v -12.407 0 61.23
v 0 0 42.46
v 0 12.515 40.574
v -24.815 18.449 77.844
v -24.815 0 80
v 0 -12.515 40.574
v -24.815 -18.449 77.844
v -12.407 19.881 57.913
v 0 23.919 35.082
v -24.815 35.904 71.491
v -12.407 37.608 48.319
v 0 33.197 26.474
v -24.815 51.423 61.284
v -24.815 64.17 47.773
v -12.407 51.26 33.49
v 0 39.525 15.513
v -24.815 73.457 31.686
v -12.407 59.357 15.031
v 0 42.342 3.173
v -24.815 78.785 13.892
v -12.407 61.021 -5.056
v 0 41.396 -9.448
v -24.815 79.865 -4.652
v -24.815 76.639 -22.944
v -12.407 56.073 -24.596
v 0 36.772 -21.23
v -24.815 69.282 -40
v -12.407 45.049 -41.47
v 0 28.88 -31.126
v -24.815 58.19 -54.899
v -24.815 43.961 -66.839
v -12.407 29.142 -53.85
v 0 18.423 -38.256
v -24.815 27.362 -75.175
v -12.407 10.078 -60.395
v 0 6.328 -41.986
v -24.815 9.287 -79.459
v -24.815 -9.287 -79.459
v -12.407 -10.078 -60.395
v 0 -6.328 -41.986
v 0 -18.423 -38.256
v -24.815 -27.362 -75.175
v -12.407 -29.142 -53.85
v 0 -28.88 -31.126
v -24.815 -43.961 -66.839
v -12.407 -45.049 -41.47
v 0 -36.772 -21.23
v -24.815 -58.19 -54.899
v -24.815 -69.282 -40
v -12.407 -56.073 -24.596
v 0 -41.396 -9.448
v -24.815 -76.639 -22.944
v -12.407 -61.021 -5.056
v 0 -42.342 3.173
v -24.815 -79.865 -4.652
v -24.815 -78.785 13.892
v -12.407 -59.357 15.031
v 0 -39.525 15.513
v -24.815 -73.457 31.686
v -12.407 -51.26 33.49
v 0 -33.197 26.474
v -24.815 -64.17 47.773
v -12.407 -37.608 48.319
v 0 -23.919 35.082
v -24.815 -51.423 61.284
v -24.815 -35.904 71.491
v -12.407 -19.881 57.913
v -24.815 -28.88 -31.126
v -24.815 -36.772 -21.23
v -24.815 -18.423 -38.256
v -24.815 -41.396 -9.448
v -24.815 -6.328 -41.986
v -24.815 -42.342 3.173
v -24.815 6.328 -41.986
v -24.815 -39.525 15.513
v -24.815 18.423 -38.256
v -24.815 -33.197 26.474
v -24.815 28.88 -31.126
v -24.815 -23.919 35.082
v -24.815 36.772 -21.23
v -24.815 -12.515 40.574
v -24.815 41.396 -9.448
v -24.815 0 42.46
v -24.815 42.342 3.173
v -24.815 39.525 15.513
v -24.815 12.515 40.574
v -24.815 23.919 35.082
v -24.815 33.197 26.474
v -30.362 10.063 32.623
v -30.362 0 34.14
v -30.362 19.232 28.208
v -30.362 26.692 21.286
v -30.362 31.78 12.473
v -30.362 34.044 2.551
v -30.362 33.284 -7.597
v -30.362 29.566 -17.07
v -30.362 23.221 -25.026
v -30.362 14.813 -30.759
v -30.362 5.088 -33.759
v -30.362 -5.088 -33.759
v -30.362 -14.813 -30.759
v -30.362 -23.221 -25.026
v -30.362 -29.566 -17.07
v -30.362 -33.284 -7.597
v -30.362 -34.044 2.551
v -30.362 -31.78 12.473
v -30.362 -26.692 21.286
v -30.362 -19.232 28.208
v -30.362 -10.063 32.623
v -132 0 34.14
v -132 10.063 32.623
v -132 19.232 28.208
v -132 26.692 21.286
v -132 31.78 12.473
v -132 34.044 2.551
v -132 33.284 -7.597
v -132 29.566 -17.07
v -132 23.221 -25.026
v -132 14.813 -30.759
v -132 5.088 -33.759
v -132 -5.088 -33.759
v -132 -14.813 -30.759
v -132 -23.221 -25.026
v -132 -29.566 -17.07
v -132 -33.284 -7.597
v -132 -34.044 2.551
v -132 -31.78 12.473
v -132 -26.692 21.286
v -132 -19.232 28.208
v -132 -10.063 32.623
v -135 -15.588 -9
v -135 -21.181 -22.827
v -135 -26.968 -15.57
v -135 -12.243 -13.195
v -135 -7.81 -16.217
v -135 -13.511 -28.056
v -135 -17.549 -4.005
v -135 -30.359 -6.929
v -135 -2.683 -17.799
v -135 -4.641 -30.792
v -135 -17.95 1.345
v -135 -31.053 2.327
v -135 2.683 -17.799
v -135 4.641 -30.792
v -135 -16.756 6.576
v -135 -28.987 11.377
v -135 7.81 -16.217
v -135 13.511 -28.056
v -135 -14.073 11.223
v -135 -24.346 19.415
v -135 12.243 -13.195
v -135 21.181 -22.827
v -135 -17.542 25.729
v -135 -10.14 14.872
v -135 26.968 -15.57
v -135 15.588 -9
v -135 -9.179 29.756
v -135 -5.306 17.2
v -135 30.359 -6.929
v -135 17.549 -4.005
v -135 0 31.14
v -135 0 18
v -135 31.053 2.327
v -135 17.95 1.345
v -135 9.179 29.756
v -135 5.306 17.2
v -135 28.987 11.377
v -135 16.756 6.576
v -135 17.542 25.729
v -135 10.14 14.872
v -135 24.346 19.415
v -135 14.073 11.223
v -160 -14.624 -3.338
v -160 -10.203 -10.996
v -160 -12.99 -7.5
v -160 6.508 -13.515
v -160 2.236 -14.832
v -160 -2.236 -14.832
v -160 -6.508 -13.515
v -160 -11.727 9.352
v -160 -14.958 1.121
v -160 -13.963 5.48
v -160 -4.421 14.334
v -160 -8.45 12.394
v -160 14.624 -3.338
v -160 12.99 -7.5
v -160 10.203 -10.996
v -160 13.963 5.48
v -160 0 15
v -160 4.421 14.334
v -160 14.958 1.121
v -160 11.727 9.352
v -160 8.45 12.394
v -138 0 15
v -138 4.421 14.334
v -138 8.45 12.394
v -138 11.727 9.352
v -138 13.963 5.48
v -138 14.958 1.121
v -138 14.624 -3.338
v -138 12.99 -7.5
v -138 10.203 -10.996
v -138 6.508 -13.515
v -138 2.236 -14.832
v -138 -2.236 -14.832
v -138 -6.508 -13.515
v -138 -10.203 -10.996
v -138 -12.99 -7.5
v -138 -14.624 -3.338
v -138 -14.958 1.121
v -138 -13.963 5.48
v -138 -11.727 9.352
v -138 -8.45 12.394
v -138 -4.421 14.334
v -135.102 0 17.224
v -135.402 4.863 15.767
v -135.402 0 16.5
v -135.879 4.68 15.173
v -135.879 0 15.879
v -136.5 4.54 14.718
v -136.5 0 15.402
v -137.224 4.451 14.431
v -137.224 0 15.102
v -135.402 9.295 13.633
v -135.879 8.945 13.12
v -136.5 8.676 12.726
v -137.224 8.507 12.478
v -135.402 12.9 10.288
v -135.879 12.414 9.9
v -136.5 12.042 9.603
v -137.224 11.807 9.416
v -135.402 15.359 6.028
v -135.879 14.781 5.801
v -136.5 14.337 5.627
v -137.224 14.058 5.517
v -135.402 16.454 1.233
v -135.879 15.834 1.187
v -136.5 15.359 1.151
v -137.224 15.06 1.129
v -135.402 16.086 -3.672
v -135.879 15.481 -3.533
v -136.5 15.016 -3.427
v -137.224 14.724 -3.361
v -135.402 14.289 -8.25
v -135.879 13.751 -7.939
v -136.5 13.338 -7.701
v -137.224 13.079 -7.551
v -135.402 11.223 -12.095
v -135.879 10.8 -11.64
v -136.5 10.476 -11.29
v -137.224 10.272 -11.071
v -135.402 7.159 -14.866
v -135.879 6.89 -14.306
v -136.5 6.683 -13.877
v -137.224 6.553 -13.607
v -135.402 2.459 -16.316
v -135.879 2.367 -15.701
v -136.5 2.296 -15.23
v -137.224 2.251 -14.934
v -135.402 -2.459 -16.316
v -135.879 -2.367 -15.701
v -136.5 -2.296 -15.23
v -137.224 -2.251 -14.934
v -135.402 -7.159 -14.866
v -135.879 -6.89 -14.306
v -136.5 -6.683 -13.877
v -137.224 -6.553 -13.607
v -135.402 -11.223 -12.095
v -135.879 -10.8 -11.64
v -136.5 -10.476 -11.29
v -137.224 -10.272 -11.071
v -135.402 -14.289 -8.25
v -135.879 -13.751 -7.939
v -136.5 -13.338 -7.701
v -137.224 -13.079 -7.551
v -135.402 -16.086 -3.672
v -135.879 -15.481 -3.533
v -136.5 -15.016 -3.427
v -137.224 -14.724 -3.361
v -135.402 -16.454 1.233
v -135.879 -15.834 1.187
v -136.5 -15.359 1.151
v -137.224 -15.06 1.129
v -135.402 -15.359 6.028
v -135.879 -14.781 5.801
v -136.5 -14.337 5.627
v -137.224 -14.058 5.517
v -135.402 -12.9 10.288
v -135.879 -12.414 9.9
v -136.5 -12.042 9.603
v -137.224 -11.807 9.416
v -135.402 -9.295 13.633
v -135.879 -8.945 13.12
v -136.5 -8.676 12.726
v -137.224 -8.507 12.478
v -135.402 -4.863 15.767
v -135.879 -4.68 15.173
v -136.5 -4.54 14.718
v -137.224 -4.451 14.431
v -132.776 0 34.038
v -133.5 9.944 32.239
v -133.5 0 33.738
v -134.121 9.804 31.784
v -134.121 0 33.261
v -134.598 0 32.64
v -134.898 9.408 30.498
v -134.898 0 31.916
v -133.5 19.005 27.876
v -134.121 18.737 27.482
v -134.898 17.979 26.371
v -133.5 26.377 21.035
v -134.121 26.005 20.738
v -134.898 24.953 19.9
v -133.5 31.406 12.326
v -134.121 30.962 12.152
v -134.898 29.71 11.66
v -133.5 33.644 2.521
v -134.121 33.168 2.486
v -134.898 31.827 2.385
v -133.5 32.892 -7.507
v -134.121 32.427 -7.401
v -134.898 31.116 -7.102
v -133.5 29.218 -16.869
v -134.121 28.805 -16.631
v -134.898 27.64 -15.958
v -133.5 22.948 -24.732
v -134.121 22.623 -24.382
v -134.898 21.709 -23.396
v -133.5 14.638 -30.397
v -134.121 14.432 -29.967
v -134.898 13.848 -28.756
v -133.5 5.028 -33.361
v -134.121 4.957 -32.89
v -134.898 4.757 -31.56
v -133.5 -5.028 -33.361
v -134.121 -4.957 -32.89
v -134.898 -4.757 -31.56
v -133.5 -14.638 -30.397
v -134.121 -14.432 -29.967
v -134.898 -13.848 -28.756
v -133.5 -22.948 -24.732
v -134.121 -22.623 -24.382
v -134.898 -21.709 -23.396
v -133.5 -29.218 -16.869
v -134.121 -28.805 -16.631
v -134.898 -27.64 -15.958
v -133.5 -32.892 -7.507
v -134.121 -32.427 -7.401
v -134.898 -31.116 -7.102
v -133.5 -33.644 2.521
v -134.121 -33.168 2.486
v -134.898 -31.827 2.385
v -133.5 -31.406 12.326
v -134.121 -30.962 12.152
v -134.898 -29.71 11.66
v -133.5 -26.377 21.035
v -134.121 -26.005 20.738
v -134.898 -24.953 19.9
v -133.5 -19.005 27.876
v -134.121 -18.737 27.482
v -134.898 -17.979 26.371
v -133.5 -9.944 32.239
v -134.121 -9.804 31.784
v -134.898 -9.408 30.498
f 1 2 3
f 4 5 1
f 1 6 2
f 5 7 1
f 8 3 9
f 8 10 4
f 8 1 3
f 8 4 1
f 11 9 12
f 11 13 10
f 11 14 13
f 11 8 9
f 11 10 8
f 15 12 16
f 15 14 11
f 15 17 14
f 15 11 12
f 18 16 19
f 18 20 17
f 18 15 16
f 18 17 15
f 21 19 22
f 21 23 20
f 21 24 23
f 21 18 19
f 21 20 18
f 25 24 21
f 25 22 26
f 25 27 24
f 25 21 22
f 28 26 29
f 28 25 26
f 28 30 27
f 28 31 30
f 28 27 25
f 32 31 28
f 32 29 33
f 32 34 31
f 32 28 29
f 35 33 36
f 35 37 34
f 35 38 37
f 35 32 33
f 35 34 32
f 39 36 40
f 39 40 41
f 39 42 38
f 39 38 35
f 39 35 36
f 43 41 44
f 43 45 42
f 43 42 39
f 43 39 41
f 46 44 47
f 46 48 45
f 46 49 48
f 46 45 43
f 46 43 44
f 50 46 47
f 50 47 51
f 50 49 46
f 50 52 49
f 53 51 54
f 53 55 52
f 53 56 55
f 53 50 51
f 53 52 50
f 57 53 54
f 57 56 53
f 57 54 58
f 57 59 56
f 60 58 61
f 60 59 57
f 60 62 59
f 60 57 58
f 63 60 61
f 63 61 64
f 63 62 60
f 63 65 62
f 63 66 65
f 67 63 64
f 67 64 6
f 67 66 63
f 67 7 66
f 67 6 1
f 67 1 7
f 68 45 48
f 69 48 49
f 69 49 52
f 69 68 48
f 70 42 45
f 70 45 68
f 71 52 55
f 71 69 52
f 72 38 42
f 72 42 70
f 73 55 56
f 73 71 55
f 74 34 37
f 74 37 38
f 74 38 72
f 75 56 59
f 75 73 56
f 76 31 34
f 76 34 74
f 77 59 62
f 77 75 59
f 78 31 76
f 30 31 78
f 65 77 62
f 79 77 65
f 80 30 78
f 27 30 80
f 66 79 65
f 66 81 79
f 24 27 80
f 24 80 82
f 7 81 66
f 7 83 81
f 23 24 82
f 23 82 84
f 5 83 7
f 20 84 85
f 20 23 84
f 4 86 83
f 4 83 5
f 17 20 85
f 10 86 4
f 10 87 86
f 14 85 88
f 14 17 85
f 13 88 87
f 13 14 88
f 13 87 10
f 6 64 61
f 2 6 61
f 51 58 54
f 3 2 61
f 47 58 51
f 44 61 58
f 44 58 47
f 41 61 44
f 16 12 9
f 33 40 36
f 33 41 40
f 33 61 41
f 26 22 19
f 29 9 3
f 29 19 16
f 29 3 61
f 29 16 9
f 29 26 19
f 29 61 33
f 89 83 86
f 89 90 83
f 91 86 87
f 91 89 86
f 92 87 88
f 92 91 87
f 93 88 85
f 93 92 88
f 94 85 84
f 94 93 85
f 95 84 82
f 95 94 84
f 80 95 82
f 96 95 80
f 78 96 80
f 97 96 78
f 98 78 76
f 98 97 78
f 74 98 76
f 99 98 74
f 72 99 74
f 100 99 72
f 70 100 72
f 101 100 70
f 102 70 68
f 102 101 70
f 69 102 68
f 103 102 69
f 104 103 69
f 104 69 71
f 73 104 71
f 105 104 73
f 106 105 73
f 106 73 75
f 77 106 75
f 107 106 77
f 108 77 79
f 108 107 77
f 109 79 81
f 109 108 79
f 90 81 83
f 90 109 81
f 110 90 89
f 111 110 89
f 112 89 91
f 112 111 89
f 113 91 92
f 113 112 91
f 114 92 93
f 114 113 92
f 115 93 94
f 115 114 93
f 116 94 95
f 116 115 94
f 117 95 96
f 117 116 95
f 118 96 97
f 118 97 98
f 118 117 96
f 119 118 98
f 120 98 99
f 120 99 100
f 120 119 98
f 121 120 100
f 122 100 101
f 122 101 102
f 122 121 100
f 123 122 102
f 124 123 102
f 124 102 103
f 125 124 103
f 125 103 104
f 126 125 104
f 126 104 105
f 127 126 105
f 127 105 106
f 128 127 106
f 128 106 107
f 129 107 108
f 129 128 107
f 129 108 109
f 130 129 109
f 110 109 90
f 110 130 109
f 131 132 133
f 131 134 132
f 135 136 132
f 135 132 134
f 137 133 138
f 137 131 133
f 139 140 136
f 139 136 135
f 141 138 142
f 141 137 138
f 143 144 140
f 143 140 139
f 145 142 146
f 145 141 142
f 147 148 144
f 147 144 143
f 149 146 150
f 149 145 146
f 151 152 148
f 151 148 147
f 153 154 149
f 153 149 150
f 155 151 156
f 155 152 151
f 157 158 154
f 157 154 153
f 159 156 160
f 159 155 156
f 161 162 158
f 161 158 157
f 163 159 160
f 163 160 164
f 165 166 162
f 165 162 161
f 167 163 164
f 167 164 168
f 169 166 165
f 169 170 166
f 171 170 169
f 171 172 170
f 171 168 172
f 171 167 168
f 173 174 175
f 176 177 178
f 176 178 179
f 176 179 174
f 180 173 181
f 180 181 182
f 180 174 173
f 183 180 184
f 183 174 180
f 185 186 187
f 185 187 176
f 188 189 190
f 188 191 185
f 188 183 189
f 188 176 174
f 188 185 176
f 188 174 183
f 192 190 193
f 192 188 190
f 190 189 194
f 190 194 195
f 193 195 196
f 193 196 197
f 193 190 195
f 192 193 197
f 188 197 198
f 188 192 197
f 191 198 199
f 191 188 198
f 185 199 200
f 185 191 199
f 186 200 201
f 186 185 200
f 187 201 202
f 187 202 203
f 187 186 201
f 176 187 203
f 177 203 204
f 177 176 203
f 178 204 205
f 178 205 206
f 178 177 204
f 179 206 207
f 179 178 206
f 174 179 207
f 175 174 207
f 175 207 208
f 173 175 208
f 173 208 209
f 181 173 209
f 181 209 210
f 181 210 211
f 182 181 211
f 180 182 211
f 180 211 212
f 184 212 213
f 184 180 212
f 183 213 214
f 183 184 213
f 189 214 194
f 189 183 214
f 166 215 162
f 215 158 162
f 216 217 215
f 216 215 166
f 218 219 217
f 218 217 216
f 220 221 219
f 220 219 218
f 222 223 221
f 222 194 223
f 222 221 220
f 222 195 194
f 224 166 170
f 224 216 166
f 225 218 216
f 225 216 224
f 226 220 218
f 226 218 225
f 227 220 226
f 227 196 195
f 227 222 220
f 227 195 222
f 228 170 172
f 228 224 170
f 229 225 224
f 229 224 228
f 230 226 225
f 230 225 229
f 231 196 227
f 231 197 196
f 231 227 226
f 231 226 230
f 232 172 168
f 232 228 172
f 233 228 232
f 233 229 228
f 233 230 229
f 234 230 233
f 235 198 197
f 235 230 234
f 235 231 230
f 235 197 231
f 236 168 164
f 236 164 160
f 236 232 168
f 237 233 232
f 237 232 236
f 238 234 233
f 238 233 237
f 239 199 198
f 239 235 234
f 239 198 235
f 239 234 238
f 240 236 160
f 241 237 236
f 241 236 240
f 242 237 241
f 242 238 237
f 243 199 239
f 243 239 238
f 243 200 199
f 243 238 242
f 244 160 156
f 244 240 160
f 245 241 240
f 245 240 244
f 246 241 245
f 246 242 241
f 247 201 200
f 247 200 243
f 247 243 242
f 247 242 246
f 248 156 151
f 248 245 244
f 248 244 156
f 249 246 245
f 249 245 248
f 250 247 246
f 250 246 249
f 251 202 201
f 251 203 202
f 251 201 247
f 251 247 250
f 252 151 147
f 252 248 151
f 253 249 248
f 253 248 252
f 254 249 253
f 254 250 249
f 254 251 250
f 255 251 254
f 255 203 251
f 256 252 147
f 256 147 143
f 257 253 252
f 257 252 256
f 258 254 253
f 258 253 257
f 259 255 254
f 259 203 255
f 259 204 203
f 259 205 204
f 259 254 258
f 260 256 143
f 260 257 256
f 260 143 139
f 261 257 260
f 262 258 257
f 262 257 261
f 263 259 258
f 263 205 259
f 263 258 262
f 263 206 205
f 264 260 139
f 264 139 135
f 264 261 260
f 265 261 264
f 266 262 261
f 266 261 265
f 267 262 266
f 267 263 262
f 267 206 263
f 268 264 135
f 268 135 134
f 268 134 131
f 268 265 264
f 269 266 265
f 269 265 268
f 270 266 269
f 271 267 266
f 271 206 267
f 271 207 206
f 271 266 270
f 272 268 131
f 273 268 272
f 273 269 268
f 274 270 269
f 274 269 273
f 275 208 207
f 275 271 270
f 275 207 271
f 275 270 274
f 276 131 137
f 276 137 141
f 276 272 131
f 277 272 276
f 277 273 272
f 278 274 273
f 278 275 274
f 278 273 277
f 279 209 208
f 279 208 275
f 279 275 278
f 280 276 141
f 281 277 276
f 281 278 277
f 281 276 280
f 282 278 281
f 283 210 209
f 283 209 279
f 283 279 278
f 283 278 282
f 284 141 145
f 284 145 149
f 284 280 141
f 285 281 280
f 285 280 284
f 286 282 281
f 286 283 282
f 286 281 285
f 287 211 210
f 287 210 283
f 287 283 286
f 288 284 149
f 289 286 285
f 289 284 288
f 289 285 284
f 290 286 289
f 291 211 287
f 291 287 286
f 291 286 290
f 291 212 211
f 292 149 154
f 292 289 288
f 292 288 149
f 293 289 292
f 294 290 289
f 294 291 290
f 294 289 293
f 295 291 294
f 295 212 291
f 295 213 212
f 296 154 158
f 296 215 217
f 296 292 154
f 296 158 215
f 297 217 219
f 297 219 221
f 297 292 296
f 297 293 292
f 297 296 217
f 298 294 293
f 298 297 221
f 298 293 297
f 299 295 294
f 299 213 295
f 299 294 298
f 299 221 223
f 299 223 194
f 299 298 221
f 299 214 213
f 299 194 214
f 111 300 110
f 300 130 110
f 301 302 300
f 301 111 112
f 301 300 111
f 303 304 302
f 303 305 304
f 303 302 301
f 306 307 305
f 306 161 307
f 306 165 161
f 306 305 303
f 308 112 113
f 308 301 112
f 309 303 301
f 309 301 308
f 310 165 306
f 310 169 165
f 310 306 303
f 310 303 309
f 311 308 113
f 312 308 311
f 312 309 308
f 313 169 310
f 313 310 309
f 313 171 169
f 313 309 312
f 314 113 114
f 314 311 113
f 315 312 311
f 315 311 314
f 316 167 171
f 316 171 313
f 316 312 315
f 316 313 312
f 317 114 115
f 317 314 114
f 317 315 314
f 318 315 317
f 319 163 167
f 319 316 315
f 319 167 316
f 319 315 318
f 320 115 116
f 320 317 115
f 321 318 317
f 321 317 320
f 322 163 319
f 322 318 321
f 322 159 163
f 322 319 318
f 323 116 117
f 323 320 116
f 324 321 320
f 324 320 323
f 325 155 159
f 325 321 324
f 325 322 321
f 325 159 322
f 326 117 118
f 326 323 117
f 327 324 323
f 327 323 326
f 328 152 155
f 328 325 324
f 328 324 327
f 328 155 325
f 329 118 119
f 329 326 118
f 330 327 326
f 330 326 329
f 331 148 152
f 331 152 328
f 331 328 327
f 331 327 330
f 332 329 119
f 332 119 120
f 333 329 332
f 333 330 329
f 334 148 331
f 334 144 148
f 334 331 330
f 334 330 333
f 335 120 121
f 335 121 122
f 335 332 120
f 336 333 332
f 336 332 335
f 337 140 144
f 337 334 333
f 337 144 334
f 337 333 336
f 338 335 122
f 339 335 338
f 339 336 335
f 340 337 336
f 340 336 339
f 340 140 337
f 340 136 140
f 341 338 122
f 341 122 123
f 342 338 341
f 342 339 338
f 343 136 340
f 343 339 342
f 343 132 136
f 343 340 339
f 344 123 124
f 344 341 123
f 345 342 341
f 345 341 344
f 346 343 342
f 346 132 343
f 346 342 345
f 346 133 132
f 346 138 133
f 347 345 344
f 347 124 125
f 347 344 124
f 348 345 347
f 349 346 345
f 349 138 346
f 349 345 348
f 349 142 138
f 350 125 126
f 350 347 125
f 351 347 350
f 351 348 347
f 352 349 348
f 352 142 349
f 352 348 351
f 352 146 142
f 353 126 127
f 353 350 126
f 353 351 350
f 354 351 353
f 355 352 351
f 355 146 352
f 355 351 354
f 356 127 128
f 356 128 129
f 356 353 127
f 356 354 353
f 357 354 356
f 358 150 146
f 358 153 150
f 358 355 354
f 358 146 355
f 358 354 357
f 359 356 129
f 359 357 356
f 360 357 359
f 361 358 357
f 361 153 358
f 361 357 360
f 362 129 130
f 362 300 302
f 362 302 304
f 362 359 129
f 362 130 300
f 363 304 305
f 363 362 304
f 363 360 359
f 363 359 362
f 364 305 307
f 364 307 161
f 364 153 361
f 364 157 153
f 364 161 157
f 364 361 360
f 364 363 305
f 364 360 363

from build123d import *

# Parameters (mm, degrees)
F2_R = 3


with BuildPart() as f1:
    # F0 (on Front) → F1 (revolve)
    with BuildSketch(Plane.XZ):
        Polygon((-160, 15), (-160, 0), (0, 0), (0, 42.460439), (-24.814942, 80), (-24.814942, 42.460439), (-30.361943, 34.139935), (-135, 34.139935), (-135, 15), align=None)
    revolve(axis=Axis((-80, 0, 0), (-1, 0, 0)))

    # F2
    f2_edges = [f1.edges().sort_by_distance(p)[0] for p in [
        (-135, 0, -34.139935),
        (-135, 0, -15),
    ]]
    fillet(f2_edges, radius=F2_R)


solid = f1.part
